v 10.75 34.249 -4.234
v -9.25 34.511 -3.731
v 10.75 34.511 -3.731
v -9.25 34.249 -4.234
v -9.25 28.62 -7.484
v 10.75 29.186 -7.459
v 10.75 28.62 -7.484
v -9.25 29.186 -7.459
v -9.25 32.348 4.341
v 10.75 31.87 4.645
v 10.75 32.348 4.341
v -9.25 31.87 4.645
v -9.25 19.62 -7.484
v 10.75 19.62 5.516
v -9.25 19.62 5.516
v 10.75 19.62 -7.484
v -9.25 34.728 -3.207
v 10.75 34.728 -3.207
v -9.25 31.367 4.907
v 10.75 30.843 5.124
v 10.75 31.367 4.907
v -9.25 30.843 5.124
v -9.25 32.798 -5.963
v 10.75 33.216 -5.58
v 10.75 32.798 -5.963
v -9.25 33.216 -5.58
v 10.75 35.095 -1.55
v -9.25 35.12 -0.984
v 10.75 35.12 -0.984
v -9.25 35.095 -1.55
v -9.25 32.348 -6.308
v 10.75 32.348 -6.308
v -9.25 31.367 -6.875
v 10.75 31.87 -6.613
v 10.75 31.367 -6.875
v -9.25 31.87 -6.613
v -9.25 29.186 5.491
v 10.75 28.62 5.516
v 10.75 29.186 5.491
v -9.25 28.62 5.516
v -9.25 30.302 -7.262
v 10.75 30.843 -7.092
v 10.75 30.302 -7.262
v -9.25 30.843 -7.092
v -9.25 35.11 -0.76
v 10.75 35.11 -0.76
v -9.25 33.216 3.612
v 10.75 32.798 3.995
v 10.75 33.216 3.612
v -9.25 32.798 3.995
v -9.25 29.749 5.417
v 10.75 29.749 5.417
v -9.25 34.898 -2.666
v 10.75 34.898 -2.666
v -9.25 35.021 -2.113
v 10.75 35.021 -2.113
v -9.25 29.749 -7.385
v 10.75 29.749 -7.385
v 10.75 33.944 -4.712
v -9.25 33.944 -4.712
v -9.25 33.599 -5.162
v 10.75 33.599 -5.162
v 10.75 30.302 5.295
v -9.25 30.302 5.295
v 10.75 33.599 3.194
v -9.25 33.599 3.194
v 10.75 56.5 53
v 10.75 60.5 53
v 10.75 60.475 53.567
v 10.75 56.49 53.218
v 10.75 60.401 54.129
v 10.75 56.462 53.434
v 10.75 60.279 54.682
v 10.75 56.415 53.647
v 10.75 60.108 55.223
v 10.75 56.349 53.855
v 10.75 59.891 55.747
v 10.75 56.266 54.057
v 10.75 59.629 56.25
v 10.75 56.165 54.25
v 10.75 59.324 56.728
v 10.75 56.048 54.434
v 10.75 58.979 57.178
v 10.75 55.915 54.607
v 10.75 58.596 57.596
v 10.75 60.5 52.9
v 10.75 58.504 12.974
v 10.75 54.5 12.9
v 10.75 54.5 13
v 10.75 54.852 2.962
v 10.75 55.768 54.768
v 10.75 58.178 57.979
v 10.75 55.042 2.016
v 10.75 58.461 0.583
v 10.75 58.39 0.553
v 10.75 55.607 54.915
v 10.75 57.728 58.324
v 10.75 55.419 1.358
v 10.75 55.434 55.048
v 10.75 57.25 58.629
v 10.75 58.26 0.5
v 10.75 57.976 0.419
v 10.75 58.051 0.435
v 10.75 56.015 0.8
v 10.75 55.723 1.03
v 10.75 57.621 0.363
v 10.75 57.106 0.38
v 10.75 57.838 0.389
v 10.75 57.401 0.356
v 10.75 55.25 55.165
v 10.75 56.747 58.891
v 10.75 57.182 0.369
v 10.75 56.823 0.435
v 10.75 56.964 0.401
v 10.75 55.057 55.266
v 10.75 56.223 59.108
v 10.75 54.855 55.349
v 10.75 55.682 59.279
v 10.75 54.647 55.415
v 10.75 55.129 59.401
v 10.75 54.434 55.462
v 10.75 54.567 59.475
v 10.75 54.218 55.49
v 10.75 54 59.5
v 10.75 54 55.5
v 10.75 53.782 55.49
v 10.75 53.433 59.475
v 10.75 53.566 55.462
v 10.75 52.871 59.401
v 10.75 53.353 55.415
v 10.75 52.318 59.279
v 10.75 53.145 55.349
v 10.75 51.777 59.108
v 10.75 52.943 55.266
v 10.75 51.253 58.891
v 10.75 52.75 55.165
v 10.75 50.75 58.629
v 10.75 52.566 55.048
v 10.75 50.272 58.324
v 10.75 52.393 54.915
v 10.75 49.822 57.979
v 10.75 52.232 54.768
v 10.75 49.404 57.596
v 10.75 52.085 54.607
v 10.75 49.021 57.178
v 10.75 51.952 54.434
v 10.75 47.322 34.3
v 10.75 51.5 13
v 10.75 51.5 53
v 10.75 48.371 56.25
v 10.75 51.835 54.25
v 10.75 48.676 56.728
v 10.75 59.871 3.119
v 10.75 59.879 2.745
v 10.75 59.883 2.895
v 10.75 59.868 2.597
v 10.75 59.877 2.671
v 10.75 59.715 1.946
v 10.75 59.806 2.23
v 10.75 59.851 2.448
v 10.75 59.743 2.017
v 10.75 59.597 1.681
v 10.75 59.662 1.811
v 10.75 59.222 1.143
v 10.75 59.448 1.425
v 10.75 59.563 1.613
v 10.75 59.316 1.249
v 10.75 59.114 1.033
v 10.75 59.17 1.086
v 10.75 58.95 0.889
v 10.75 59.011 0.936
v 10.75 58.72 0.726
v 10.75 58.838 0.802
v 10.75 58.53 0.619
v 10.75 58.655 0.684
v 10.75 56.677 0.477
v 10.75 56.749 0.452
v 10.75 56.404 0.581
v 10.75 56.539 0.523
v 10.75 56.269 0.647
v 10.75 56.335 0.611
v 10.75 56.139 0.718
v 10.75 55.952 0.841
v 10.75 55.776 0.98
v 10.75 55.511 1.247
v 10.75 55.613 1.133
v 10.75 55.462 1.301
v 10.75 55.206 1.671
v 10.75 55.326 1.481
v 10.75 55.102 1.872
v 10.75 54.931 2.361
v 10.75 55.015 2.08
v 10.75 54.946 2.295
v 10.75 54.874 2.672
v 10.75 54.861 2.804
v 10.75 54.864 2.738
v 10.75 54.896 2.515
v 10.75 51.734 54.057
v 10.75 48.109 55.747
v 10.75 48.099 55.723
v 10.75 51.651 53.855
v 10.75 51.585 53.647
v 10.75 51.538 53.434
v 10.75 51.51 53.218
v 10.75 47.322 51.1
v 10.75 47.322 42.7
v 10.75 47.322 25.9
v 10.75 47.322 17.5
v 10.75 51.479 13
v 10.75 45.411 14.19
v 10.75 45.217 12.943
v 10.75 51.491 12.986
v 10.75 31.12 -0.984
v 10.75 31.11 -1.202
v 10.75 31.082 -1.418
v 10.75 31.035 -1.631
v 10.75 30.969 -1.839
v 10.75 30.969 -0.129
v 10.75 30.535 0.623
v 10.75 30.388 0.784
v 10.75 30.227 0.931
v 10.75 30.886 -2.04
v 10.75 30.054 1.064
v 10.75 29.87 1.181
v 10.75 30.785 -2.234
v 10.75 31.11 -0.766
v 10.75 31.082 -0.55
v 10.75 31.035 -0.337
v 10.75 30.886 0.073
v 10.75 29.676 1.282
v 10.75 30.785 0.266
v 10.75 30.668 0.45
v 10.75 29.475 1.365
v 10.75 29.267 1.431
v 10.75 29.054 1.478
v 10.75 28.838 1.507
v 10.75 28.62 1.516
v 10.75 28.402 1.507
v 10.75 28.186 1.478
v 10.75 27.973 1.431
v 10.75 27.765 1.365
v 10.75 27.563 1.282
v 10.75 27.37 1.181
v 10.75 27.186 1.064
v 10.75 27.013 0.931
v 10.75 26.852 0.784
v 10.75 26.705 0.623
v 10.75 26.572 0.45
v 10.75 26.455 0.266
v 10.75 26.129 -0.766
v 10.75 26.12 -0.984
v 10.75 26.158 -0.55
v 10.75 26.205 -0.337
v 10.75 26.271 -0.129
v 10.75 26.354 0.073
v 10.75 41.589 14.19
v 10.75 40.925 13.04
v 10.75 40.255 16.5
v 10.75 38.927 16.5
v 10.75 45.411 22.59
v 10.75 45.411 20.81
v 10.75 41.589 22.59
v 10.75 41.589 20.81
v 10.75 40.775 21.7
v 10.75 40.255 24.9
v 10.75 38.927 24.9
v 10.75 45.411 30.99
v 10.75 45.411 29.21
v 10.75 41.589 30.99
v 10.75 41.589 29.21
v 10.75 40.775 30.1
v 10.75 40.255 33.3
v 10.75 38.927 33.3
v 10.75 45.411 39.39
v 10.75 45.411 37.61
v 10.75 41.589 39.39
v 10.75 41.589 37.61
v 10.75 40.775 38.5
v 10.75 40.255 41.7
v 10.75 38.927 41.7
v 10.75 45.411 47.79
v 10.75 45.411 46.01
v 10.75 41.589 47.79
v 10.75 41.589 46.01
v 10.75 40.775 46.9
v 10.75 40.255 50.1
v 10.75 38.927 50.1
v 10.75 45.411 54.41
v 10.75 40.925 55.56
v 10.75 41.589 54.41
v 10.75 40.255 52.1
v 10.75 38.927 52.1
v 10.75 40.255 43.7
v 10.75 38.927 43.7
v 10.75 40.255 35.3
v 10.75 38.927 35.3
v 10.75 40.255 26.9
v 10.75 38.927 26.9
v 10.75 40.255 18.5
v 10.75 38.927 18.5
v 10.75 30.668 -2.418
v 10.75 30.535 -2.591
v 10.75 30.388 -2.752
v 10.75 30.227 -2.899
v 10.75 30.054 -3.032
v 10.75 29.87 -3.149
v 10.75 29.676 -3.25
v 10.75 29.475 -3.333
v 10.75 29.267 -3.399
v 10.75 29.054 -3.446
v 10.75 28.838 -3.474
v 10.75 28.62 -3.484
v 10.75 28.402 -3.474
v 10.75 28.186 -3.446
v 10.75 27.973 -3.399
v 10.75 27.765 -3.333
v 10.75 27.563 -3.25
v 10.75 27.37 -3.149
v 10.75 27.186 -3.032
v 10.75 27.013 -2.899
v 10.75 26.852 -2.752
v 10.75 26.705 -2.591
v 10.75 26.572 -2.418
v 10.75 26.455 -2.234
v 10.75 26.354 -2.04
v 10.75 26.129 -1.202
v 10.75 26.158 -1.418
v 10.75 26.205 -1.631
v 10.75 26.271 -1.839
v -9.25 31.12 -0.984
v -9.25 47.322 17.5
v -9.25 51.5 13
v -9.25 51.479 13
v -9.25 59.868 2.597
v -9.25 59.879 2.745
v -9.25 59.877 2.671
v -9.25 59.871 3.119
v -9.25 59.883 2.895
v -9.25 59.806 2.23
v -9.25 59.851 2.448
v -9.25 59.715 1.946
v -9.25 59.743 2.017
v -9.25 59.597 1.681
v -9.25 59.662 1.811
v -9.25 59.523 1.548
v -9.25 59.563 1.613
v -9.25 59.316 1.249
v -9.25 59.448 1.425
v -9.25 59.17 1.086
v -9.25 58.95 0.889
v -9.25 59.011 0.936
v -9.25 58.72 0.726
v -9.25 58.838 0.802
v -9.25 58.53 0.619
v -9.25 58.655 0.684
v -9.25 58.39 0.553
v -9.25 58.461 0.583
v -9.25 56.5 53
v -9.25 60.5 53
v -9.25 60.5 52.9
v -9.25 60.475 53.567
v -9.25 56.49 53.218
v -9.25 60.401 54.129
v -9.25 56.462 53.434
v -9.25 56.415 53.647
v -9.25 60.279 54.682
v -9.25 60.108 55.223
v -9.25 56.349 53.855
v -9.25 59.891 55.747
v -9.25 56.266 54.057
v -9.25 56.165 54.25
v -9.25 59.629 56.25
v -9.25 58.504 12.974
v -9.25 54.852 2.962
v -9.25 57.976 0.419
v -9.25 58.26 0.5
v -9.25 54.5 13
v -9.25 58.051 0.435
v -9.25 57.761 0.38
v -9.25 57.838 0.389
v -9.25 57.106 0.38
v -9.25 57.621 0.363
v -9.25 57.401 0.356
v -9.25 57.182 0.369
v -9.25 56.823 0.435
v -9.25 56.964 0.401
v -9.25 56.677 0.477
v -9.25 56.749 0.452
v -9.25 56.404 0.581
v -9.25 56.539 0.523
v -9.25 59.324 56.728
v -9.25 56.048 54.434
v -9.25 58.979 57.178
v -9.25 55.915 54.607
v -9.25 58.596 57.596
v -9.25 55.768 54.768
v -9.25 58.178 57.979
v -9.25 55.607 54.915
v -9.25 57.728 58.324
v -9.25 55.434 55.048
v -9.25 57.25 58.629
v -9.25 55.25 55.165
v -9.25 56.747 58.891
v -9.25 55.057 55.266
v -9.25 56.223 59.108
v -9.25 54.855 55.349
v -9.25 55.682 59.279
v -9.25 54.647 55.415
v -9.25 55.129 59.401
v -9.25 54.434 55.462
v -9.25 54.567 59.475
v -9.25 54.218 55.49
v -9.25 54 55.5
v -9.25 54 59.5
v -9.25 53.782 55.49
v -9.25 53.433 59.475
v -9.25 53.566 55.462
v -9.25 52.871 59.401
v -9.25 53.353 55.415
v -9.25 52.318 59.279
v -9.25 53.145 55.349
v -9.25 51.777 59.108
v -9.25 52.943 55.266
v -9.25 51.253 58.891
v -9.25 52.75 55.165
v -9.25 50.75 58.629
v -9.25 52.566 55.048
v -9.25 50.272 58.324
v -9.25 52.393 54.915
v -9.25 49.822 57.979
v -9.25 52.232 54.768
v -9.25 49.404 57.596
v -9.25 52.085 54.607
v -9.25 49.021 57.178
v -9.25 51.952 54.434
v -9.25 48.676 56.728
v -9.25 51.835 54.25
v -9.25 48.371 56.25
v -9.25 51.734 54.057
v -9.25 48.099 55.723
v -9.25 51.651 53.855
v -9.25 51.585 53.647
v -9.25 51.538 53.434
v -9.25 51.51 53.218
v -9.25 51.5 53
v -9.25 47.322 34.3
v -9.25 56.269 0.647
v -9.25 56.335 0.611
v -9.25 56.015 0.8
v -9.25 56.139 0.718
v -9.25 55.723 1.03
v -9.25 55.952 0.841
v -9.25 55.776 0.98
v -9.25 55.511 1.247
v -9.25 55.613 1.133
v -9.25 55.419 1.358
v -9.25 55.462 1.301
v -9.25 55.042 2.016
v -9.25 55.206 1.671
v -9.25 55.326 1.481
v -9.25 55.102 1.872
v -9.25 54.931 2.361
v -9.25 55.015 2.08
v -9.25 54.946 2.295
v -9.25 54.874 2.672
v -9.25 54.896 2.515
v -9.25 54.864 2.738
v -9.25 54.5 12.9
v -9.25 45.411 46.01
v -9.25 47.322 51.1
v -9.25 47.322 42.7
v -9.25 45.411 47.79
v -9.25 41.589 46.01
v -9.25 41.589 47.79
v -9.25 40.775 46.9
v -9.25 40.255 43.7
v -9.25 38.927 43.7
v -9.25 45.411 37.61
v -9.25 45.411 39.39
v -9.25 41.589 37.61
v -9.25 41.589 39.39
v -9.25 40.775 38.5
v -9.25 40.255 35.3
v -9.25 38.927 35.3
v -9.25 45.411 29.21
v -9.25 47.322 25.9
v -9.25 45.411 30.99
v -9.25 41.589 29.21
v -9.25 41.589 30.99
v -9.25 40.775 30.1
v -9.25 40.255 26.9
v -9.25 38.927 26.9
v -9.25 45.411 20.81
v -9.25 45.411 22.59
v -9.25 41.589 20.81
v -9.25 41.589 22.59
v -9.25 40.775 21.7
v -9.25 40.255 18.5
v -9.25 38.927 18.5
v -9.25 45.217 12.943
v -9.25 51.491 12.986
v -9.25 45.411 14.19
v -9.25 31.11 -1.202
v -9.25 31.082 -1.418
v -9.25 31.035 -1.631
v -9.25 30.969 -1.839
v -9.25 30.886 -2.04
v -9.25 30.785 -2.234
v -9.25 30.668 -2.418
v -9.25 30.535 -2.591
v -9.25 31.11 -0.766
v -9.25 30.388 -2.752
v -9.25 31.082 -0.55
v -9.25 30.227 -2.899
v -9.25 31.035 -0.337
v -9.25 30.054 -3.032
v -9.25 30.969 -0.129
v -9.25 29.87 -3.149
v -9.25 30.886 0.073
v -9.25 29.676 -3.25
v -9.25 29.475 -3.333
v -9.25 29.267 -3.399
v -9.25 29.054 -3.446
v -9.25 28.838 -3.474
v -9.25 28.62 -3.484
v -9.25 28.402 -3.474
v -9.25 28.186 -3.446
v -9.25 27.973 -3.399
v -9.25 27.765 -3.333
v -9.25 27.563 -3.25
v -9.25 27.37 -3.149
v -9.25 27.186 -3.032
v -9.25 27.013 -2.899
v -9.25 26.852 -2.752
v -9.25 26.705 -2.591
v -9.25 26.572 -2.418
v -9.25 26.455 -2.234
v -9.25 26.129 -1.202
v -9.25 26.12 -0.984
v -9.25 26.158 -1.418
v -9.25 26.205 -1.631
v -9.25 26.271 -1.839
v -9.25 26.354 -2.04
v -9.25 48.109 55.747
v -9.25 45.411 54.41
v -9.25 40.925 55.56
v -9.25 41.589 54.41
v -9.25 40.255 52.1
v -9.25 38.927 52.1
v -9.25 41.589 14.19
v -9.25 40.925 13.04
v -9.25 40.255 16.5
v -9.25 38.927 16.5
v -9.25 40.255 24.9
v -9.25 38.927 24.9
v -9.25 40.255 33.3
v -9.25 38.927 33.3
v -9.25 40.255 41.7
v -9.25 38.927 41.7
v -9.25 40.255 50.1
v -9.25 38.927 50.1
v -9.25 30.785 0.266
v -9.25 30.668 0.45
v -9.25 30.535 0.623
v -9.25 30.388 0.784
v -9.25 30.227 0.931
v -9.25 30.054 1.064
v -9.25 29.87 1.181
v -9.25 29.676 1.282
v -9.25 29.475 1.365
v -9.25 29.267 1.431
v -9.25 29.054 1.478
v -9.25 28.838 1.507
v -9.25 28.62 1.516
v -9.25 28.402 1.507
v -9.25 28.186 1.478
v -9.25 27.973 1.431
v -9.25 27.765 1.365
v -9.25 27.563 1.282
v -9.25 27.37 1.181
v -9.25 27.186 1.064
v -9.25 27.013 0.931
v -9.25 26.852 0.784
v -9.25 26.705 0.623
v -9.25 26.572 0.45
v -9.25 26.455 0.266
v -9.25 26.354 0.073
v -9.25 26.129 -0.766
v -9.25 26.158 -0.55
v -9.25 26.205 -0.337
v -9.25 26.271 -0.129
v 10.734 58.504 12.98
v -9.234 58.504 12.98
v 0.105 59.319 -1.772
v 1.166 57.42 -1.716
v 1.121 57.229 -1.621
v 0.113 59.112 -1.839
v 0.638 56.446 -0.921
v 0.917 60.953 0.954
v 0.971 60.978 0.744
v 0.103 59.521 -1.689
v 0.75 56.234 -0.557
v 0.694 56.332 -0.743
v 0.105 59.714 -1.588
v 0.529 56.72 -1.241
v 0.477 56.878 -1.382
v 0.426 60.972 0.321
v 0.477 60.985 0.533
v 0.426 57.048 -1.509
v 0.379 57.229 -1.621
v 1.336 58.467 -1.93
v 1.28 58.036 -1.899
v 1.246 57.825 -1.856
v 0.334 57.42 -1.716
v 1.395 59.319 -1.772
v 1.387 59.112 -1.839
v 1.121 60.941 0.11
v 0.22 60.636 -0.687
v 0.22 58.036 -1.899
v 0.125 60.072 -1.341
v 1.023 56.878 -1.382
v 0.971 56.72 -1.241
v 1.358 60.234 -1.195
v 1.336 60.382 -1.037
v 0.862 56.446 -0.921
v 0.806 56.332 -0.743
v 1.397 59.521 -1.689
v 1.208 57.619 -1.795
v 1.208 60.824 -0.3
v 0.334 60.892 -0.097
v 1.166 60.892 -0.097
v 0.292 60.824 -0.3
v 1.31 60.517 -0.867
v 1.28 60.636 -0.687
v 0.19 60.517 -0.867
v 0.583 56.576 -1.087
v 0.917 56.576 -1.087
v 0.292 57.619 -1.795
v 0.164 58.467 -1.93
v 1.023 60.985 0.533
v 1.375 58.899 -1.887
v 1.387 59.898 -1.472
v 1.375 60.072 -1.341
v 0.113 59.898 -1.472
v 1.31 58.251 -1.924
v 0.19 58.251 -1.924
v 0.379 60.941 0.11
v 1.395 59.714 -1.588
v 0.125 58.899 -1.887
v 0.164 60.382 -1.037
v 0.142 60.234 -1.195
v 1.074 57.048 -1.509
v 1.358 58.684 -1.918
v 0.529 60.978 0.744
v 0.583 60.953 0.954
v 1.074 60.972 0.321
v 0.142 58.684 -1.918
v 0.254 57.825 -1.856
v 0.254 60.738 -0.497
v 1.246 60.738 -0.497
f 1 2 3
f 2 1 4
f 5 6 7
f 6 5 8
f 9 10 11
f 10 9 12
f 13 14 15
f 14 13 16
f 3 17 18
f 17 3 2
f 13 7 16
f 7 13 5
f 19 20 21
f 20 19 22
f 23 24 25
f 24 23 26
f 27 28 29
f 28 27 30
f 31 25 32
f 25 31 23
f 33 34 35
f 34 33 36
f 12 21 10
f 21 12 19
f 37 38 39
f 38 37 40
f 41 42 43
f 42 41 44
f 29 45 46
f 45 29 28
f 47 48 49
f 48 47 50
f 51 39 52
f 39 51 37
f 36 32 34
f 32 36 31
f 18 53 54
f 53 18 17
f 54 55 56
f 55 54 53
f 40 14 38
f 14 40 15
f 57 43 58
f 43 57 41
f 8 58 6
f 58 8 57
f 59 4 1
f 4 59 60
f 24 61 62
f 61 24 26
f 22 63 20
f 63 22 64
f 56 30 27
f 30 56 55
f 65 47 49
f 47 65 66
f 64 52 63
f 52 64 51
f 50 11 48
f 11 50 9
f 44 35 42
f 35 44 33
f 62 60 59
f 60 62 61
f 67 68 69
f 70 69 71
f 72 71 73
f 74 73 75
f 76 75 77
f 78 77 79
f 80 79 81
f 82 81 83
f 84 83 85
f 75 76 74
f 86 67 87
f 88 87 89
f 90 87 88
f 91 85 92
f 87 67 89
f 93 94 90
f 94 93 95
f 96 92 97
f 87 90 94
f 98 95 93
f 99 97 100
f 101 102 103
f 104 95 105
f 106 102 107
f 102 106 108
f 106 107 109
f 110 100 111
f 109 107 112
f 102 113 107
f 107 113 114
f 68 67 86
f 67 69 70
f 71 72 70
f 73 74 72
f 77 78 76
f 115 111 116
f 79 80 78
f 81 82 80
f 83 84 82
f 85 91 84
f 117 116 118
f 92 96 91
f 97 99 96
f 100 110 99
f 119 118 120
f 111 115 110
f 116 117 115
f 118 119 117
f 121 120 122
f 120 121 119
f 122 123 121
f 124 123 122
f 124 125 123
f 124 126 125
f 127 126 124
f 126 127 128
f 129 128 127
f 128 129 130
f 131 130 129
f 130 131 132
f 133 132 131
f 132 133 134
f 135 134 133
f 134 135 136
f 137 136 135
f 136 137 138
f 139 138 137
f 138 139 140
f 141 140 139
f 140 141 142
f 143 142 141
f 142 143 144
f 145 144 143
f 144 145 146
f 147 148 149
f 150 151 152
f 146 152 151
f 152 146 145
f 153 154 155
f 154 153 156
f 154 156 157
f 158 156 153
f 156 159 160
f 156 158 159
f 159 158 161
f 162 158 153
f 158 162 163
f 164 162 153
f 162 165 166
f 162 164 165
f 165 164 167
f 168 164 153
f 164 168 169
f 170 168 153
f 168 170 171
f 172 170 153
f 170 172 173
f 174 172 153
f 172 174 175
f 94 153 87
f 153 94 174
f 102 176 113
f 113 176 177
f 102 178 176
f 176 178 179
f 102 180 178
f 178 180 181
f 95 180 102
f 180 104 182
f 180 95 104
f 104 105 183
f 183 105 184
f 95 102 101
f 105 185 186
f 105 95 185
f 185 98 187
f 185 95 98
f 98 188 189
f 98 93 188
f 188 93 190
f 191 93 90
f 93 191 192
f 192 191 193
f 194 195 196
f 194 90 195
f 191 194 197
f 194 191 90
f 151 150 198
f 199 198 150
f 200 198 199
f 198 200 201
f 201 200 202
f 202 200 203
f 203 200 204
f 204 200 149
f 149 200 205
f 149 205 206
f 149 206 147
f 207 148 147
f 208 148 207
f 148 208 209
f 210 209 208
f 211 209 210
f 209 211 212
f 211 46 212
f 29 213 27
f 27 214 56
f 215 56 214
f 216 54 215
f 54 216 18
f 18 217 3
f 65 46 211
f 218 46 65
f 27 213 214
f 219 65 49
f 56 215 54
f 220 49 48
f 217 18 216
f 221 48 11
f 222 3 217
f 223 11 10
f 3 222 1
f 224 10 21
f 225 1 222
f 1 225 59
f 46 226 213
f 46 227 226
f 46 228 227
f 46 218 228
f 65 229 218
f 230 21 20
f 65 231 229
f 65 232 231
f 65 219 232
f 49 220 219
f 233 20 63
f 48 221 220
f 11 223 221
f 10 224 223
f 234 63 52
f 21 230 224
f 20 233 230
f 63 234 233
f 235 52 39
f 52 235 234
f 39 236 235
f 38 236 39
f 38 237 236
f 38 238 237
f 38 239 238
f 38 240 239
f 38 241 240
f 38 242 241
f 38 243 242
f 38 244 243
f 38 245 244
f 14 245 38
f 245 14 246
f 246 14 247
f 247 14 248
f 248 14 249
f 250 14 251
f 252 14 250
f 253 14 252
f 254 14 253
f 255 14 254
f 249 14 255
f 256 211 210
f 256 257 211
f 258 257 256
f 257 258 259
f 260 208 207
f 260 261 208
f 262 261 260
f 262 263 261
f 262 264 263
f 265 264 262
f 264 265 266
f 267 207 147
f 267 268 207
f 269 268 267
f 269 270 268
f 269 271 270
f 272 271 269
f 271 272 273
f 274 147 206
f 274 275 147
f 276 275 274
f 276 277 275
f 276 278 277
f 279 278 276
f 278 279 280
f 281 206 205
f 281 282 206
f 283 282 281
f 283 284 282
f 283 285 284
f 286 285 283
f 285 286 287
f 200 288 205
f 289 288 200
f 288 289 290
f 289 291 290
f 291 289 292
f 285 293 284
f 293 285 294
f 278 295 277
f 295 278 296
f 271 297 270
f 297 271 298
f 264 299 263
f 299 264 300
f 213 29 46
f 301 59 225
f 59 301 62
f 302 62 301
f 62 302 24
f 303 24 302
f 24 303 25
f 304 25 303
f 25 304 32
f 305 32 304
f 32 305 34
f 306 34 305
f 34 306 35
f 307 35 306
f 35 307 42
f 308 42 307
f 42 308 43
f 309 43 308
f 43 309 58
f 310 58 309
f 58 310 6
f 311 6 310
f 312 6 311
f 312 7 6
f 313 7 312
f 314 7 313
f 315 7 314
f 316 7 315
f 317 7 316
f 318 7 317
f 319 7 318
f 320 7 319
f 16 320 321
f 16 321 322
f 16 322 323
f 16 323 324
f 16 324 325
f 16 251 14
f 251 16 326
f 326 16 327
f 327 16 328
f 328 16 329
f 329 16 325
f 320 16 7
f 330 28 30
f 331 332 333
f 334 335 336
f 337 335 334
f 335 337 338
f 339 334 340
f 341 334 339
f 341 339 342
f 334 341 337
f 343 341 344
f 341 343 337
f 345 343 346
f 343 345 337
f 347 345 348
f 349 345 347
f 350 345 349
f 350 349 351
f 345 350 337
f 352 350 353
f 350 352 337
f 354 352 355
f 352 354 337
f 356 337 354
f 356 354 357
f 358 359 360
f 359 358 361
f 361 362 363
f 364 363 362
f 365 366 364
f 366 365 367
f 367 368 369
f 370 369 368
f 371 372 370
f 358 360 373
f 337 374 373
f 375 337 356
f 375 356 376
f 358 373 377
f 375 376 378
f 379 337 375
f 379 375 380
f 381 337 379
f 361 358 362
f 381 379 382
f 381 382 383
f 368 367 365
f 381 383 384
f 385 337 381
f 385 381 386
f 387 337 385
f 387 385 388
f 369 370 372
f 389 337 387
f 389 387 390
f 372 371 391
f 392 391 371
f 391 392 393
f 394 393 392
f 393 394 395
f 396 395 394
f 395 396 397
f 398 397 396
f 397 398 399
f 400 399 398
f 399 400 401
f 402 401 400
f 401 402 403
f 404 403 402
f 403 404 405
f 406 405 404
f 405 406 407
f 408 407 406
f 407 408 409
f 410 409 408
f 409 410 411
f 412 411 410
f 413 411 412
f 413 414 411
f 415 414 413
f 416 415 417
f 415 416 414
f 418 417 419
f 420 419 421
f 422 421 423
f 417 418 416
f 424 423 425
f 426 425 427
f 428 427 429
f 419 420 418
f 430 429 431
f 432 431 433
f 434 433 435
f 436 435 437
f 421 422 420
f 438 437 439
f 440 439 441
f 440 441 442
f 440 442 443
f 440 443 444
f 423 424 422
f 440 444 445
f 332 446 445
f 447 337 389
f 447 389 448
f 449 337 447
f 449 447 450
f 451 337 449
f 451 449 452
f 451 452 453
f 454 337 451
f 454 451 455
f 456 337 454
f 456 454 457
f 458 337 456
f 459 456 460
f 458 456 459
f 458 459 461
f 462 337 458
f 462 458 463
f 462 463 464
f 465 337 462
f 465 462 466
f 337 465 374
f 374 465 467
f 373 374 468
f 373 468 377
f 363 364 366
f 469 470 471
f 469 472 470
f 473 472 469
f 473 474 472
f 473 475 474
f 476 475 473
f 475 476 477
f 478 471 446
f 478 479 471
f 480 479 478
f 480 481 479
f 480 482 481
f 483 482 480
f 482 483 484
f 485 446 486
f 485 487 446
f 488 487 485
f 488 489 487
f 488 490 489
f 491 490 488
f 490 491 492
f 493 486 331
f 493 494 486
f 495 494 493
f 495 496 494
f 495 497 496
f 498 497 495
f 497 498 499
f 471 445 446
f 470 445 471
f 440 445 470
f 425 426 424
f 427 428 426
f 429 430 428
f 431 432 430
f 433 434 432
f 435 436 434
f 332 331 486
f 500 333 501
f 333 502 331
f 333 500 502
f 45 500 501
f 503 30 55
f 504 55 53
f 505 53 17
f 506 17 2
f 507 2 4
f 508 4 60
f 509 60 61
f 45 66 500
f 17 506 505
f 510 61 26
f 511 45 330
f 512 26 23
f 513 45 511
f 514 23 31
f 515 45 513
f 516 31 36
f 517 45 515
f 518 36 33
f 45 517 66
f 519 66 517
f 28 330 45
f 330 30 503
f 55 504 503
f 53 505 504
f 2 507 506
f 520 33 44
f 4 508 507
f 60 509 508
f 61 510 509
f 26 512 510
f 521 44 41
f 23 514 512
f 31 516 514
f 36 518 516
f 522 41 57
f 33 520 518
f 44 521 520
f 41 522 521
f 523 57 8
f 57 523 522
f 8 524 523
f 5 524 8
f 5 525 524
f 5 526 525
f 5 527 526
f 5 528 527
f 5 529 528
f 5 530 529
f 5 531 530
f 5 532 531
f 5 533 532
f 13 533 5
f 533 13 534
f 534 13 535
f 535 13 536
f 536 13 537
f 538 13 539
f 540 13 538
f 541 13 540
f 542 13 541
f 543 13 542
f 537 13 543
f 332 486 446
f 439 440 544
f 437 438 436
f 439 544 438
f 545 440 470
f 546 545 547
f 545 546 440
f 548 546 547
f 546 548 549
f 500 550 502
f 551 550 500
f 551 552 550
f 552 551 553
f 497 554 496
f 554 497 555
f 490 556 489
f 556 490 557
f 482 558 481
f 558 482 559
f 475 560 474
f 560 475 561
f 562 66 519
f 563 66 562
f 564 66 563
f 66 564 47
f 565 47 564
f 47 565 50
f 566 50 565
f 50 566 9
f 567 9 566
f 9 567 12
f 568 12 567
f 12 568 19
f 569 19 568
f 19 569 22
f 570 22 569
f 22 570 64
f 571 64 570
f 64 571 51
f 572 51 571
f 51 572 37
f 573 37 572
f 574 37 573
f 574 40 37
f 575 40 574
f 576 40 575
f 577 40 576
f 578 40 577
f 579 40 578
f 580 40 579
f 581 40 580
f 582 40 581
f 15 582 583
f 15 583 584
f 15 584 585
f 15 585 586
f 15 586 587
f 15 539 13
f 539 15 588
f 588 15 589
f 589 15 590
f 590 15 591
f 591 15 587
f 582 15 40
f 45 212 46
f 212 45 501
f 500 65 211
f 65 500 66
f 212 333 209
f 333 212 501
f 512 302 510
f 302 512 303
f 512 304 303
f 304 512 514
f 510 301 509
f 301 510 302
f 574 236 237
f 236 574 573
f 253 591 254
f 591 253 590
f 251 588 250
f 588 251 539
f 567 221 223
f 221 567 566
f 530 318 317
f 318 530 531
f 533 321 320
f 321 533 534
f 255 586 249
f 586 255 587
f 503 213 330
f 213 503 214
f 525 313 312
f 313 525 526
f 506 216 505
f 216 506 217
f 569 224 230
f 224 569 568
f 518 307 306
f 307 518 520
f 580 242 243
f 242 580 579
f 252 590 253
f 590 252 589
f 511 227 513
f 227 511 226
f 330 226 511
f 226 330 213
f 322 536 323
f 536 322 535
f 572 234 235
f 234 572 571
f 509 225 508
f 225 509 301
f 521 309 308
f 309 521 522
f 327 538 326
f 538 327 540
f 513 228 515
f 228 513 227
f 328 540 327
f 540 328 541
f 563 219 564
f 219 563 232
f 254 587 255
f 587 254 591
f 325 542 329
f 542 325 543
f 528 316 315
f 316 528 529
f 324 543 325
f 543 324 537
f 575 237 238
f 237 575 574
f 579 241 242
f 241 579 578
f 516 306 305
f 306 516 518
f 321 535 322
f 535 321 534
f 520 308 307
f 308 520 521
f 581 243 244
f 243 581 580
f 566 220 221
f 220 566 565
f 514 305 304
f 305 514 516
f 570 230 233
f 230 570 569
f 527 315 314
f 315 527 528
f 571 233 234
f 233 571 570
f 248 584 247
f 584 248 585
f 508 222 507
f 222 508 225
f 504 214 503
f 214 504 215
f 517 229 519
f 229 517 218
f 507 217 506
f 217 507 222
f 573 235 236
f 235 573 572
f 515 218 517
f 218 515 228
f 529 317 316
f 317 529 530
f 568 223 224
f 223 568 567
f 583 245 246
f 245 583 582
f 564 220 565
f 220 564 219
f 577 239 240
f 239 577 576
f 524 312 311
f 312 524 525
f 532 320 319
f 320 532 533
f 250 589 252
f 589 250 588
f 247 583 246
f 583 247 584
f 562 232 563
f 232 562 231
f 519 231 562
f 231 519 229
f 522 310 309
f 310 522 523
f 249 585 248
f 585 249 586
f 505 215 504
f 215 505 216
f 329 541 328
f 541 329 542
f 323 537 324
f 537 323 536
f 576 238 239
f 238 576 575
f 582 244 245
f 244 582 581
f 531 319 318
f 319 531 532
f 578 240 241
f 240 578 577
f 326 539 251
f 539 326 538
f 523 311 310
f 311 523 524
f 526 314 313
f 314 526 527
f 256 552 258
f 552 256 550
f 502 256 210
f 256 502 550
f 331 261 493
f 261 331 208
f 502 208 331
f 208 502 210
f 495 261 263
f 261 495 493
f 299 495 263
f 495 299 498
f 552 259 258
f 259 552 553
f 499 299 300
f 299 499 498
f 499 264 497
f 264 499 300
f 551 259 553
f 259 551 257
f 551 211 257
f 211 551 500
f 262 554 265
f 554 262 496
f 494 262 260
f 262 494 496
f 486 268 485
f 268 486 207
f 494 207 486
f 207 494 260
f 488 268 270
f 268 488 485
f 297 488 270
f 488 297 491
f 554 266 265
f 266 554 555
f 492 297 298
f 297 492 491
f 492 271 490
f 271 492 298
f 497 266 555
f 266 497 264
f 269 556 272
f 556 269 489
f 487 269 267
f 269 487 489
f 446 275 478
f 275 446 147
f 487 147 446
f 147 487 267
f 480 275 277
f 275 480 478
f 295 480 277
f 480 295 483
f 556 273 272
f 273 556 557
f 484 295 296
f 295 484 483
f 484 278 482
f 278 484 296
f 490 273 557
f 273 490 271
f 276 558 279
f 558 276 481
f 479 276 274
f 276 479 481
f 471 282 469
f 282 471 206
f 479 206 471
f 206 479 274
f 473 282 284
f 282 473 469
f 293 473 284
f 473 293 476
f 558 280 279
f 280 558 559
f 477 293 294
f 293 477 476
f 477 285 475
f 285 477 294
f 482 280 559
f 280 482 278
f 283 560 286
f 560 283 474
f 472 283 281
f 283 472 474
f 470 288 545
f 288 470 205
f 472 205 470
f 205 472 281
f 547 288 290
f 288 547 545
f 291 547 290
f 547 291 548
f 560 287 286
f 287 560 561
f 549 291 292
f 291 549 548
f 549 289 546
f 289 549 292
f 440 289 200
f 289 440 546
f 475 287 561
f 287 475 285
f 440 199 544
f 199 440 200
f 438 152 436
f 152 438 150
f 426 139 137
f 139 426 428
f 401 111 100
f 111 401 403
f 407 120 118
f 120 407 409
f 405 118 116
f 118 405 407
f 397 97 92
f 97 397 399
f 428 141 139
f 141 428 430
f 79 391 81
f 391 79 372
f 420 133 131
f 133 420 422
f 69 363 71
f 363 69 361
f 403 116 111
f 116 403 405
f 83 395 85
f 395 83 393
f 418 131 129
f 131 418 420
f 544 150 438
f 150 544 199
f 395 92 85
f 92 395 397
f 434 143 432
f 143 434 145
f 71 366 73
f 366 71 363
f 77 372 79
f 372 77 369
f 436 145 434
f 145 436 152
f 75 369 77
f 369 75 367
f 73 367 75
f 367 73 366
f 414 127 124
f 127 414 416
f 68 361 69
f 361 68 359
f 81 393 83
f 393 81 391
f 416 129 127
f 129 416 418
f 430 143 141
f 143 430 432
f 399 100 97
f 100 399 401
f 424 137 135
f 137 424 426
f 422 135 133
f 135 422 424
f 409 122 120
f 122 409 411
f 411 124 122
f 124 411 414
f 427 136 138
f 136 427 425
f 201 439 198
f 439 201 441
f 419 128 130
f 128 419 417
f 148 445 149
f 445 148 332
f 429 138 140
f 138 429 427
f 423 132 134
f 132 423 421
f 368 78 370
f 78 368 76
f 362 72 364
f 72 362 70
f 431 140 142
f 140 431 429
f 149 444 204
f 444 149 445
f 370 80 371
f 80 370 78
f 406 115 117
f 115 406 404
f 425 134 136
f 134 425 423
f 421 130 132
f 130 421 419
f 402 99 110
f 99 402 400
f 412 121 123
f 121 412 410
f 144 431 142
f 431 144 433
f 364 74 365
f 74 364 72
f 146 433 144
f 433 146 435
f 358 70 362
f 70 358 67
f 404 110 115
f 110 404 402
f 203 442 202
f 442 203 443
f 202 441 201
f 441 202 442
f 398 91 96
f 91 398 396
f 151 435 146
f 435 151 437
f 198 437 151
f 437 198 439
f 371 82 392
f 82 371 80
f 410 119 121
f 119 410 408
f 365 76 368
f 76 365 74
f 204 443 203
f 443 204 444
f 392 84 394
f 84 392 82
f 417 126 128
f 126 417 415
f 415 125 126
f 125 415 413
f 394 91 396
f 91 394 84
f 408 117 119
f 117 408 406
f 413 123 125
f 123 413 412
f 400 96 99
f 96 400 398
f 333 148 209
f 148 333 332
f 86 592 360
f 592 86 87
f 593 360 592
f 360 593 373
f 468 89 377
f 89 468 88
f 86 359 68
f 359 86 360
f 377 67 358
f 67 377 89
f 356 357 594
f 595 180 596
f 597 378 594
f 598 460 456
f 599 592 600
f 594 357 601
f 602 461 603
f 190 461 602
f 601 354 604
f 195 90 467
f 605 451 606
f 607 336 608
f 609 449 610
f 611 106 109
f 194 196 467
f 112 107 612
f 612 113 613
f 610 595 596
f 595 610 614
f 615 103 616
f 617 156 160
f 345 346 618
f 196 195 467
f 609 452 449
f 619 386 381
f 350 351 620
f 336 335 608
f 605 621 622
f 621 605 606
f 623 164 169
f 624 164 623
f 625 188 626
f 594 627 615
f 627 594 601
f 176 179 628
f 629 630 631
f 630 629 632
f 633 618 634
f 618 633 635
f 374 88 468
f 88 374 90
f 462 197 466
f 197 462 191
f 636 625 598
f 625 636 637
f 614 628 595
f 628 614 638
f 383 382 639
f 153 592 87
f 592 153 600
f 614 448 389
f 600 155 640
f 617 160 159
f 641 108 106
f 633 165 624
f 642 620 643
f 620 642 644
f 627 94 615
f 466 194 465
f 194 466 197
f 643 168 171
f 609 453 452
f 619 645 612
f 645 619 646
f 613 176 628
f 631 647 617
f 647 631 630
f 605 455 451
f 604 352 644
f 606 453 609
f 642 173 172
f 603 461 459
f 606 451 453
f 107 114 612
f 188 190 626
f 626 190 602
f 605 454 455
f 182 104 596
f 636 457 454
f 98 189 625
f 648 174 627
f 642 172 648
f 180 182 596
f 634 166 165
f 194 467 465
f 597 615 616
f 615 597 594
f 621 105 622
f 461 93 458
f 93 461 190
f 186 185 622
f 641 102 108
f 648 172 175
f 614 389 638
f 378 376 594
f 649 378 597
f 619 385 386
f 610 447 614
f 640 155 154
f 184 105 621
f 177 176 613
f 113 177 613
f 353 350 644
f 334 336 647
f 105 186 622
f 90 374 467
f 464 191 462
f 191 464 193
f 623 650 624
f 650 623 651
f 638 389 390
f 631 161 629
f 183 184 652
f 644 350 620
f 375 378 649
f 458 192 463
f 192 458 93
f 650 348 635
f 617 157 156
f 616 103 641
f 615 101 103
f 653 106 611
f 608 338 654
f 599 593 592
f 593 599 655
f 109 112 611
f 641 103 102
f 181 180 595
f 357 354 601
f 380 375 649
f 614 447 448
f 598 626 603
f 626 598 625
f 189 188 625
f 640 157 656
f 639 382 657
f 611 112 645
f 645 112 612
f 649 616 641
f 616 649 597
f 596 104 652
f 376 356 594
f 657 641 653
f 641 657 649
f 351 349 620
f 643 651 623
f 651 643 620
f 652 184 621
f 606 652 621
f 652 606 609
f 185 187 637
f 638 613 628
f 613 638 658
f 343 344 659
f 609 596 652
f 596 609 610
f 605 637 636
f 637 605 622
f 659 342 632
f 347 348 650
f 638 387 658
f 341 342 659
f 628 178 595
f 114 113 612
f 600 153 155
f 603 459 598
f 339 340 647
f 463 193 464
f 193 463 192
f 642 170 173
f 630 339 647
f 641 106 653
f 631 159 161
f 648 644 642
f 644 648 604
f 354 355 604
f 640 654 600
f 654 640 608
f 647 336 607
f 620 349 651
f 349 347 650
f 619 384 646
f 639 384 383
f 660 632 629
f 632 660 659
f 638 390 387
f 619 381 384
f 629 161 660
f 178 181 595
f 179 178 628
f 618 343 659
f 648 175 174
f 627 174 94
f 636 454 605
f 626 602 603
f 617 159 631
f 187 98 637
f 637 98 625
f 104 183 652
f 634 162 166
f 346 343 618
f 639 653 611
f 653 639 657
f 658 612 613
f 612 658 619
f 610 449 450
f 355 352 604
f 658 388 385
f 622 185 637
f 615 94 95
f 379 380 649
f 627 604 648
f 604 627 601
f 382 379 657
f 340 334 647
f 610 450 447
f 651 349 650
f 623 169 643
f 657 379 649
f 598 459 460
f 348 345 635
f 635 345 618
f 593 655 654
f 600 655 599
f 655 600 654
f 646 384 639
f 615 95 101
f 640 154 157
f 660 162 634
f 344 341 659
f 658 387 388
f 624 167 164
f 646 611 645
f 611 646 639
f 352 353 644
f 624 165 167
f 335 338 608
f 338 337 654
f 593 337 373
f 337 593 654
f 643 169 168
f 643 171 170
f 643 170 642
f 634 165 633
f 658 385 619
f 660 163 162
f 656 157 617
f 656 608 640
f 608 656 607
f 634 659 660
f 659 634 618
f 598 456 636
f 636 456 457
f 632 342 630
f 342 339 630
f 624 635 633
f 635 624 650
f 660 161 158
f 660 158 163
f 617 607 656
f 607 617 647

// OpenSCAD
part = "all"; // [all, clip, loop]

handled = 35;  // diameter (width) of the tool grip
handlel = 52;   // length of the tool grip
boltd = 5;  // diameter of the through bolt
nutd = 10;  // diameter of the nut
nuth = 3.5; // thickness of the nut

loopt = 4;  // thickness of the loop/clip

handleoff = 10;   // horz offset from handle
handlea = 40;     // angle offset towards battery

cliph = 20; // width of the clip body
clipl = 40; // length of the belt clip section
clearance = 1.5;  // between the clip part and the handle loop

bits = 5;         // number of bit holders in the clip
bittight = 0.98;  // bit holder scaling/tightness factor

//---------------------------------------------------
looph = nutd+3;
clipw = looph; // width of the clip barrel
barrell = cliph+max(loopt*2,nuth*4)+clearance;
ho = handleoff + ((bits>0) ? 10 : 0);

$fn=72;

module loop(w) {
   d = handled+w*2;
   h = looph;
   tx = (handlel-handled)/2;
   hull() {
      translate([-tx,0,0]) cylinder(d=d,h=h + (w?0:1));
      translate([tx,0,0]) cylinder(d=d,h=h + (w?0:1));
   }
}

module bitholder() {
   w = 2.5;
   k = 7.8+w;
   difference() {
      hull() {
         translate([-(k*.9)/2,k/2,0]) cube([k*0.9,0.1,cliph]);
         rotate([0,0,30]) cylinder(d=k, h=cliph, $fn=6);
      }
      union() {
         // this needs to be slightly tight
         rotate([0,0,30]) cylinder(d=7.8*bittight, h=cliph+0.1, $fn=6);
         
         translate([-1,-7.8,-0.05])
            cube([2,7.8,cliph+0.1]);
      }
   }
}

module clip() {
   
   translate([clipl-loopt+.95,loopt/2-0.58,0])
   rotate([0,0,handlea])
   translate([0,-ho-clipw/2,0])
   difference() {
      union() {
         rotate([0,-90,-handlea]) intersection() {
            translate([barrell/2,0,0]) barrel();
            rotate([0,90,0]) cylinder(d=looph*2,h=cliph);
         }
         cube([loopt,ho+clipw/2,cliph]);
      }
      translate([0,0,-1]) cylinder(d=boltd,h=cliph*2);
   }
   
   union() {
      if( bits > 0 ) {
         for(i=[1:bits]) {
            translate([clipl-8.4*i+7.8/2,-loopt, 0]) bitholder();
         }
      }
      cube([clipl,loopt,cliph]);
      translate([0,clipw/2,0]) difference() {
         cylinder(d=looph,h=cliph);
         hull() {
            cylinder(d=clipw-loopt*2,h=cliph);
            translate([clipw/2,-(clipw-loopt*2)/2,0])
               cube([0.1,clipw-loopt*2,cliph]);
         }
      }
      hull() {
         translate([0,clipw-loopt,0]) cube([0.1,loopt,cliph]);
         translate([clipl,clipw-loopt*1.5,0])
            cube([0.1,loopt,cliph]);
      }
      hull() {
         intersection() {
            translate([clipl,loopt,0])
               cube([clipl,clipw,cliph]);
            union() {
               translate([clipl,clipw-loopt*1.5,0])
                  cube([0.1,loopt,cliph]);

               l = loopt*1.25;
               translate([clipl*1.25+l/2,clipw-loopt/2,cliph/2])
                  rotate([0,-15,25]) cylinder(d=l,h=cliph/2*1.5);
               translate([clipl*1.25+l/2,clipw-loopt/2,cliph/2])
                  mirror([0,0,1])
                  rotate([0,-15,25]) cylinder(d=l,h=cliph/2*1.5);
            }
         }
      }
   }
}

module barrel() {
   translate([-barrell/2,0,0])
   hull() {
      rotate([0,90,0]) cylinder(d=looph,h=barrell*.95);
      translate([-handled*.025,-boltd-loopt,-looph/2])
         cube([barrell,0.05,looph]);
   }
}

module body() {
   difference() {
      hull() {
         loop(loopt);
         translate([0,handled/2+loopt+boltd,looph/2]) barrel();
      }
      union() {
         translate([0,0,-0.01]) loop(0);

         sp = cliph+clearance+loopt*2;
         xo = handlel-handled;
         translate([-sp/2,handled/2+loopt+boltd,looph/2])
            rotate([0,90,0]) 
         union() {
            cylinder(d=boltd,h=sp);
            translate([0,0,-handlel+0.1])
               cylinder(d=nutd,h=handlel,$fn=6);
            translate([0,0,sp-0.1])
               cylinder(d=nutd,h=handlel);
         }
         
         translate([-cliph/2,0,-0.01])
            cube([cliph+clearance,handled,looph+1]);
      }
   }
}

if( part == "loop" ) {
  body();
} else if( part == "clip" ) {
   translate([0,50,0]) clip();
} else if( part == "all" ) {
   %body();
   translate([(clearance-cliph)/2,ho+handled/2+10,clipl+looph])
      rotate([0,90,0]) clip();
}
